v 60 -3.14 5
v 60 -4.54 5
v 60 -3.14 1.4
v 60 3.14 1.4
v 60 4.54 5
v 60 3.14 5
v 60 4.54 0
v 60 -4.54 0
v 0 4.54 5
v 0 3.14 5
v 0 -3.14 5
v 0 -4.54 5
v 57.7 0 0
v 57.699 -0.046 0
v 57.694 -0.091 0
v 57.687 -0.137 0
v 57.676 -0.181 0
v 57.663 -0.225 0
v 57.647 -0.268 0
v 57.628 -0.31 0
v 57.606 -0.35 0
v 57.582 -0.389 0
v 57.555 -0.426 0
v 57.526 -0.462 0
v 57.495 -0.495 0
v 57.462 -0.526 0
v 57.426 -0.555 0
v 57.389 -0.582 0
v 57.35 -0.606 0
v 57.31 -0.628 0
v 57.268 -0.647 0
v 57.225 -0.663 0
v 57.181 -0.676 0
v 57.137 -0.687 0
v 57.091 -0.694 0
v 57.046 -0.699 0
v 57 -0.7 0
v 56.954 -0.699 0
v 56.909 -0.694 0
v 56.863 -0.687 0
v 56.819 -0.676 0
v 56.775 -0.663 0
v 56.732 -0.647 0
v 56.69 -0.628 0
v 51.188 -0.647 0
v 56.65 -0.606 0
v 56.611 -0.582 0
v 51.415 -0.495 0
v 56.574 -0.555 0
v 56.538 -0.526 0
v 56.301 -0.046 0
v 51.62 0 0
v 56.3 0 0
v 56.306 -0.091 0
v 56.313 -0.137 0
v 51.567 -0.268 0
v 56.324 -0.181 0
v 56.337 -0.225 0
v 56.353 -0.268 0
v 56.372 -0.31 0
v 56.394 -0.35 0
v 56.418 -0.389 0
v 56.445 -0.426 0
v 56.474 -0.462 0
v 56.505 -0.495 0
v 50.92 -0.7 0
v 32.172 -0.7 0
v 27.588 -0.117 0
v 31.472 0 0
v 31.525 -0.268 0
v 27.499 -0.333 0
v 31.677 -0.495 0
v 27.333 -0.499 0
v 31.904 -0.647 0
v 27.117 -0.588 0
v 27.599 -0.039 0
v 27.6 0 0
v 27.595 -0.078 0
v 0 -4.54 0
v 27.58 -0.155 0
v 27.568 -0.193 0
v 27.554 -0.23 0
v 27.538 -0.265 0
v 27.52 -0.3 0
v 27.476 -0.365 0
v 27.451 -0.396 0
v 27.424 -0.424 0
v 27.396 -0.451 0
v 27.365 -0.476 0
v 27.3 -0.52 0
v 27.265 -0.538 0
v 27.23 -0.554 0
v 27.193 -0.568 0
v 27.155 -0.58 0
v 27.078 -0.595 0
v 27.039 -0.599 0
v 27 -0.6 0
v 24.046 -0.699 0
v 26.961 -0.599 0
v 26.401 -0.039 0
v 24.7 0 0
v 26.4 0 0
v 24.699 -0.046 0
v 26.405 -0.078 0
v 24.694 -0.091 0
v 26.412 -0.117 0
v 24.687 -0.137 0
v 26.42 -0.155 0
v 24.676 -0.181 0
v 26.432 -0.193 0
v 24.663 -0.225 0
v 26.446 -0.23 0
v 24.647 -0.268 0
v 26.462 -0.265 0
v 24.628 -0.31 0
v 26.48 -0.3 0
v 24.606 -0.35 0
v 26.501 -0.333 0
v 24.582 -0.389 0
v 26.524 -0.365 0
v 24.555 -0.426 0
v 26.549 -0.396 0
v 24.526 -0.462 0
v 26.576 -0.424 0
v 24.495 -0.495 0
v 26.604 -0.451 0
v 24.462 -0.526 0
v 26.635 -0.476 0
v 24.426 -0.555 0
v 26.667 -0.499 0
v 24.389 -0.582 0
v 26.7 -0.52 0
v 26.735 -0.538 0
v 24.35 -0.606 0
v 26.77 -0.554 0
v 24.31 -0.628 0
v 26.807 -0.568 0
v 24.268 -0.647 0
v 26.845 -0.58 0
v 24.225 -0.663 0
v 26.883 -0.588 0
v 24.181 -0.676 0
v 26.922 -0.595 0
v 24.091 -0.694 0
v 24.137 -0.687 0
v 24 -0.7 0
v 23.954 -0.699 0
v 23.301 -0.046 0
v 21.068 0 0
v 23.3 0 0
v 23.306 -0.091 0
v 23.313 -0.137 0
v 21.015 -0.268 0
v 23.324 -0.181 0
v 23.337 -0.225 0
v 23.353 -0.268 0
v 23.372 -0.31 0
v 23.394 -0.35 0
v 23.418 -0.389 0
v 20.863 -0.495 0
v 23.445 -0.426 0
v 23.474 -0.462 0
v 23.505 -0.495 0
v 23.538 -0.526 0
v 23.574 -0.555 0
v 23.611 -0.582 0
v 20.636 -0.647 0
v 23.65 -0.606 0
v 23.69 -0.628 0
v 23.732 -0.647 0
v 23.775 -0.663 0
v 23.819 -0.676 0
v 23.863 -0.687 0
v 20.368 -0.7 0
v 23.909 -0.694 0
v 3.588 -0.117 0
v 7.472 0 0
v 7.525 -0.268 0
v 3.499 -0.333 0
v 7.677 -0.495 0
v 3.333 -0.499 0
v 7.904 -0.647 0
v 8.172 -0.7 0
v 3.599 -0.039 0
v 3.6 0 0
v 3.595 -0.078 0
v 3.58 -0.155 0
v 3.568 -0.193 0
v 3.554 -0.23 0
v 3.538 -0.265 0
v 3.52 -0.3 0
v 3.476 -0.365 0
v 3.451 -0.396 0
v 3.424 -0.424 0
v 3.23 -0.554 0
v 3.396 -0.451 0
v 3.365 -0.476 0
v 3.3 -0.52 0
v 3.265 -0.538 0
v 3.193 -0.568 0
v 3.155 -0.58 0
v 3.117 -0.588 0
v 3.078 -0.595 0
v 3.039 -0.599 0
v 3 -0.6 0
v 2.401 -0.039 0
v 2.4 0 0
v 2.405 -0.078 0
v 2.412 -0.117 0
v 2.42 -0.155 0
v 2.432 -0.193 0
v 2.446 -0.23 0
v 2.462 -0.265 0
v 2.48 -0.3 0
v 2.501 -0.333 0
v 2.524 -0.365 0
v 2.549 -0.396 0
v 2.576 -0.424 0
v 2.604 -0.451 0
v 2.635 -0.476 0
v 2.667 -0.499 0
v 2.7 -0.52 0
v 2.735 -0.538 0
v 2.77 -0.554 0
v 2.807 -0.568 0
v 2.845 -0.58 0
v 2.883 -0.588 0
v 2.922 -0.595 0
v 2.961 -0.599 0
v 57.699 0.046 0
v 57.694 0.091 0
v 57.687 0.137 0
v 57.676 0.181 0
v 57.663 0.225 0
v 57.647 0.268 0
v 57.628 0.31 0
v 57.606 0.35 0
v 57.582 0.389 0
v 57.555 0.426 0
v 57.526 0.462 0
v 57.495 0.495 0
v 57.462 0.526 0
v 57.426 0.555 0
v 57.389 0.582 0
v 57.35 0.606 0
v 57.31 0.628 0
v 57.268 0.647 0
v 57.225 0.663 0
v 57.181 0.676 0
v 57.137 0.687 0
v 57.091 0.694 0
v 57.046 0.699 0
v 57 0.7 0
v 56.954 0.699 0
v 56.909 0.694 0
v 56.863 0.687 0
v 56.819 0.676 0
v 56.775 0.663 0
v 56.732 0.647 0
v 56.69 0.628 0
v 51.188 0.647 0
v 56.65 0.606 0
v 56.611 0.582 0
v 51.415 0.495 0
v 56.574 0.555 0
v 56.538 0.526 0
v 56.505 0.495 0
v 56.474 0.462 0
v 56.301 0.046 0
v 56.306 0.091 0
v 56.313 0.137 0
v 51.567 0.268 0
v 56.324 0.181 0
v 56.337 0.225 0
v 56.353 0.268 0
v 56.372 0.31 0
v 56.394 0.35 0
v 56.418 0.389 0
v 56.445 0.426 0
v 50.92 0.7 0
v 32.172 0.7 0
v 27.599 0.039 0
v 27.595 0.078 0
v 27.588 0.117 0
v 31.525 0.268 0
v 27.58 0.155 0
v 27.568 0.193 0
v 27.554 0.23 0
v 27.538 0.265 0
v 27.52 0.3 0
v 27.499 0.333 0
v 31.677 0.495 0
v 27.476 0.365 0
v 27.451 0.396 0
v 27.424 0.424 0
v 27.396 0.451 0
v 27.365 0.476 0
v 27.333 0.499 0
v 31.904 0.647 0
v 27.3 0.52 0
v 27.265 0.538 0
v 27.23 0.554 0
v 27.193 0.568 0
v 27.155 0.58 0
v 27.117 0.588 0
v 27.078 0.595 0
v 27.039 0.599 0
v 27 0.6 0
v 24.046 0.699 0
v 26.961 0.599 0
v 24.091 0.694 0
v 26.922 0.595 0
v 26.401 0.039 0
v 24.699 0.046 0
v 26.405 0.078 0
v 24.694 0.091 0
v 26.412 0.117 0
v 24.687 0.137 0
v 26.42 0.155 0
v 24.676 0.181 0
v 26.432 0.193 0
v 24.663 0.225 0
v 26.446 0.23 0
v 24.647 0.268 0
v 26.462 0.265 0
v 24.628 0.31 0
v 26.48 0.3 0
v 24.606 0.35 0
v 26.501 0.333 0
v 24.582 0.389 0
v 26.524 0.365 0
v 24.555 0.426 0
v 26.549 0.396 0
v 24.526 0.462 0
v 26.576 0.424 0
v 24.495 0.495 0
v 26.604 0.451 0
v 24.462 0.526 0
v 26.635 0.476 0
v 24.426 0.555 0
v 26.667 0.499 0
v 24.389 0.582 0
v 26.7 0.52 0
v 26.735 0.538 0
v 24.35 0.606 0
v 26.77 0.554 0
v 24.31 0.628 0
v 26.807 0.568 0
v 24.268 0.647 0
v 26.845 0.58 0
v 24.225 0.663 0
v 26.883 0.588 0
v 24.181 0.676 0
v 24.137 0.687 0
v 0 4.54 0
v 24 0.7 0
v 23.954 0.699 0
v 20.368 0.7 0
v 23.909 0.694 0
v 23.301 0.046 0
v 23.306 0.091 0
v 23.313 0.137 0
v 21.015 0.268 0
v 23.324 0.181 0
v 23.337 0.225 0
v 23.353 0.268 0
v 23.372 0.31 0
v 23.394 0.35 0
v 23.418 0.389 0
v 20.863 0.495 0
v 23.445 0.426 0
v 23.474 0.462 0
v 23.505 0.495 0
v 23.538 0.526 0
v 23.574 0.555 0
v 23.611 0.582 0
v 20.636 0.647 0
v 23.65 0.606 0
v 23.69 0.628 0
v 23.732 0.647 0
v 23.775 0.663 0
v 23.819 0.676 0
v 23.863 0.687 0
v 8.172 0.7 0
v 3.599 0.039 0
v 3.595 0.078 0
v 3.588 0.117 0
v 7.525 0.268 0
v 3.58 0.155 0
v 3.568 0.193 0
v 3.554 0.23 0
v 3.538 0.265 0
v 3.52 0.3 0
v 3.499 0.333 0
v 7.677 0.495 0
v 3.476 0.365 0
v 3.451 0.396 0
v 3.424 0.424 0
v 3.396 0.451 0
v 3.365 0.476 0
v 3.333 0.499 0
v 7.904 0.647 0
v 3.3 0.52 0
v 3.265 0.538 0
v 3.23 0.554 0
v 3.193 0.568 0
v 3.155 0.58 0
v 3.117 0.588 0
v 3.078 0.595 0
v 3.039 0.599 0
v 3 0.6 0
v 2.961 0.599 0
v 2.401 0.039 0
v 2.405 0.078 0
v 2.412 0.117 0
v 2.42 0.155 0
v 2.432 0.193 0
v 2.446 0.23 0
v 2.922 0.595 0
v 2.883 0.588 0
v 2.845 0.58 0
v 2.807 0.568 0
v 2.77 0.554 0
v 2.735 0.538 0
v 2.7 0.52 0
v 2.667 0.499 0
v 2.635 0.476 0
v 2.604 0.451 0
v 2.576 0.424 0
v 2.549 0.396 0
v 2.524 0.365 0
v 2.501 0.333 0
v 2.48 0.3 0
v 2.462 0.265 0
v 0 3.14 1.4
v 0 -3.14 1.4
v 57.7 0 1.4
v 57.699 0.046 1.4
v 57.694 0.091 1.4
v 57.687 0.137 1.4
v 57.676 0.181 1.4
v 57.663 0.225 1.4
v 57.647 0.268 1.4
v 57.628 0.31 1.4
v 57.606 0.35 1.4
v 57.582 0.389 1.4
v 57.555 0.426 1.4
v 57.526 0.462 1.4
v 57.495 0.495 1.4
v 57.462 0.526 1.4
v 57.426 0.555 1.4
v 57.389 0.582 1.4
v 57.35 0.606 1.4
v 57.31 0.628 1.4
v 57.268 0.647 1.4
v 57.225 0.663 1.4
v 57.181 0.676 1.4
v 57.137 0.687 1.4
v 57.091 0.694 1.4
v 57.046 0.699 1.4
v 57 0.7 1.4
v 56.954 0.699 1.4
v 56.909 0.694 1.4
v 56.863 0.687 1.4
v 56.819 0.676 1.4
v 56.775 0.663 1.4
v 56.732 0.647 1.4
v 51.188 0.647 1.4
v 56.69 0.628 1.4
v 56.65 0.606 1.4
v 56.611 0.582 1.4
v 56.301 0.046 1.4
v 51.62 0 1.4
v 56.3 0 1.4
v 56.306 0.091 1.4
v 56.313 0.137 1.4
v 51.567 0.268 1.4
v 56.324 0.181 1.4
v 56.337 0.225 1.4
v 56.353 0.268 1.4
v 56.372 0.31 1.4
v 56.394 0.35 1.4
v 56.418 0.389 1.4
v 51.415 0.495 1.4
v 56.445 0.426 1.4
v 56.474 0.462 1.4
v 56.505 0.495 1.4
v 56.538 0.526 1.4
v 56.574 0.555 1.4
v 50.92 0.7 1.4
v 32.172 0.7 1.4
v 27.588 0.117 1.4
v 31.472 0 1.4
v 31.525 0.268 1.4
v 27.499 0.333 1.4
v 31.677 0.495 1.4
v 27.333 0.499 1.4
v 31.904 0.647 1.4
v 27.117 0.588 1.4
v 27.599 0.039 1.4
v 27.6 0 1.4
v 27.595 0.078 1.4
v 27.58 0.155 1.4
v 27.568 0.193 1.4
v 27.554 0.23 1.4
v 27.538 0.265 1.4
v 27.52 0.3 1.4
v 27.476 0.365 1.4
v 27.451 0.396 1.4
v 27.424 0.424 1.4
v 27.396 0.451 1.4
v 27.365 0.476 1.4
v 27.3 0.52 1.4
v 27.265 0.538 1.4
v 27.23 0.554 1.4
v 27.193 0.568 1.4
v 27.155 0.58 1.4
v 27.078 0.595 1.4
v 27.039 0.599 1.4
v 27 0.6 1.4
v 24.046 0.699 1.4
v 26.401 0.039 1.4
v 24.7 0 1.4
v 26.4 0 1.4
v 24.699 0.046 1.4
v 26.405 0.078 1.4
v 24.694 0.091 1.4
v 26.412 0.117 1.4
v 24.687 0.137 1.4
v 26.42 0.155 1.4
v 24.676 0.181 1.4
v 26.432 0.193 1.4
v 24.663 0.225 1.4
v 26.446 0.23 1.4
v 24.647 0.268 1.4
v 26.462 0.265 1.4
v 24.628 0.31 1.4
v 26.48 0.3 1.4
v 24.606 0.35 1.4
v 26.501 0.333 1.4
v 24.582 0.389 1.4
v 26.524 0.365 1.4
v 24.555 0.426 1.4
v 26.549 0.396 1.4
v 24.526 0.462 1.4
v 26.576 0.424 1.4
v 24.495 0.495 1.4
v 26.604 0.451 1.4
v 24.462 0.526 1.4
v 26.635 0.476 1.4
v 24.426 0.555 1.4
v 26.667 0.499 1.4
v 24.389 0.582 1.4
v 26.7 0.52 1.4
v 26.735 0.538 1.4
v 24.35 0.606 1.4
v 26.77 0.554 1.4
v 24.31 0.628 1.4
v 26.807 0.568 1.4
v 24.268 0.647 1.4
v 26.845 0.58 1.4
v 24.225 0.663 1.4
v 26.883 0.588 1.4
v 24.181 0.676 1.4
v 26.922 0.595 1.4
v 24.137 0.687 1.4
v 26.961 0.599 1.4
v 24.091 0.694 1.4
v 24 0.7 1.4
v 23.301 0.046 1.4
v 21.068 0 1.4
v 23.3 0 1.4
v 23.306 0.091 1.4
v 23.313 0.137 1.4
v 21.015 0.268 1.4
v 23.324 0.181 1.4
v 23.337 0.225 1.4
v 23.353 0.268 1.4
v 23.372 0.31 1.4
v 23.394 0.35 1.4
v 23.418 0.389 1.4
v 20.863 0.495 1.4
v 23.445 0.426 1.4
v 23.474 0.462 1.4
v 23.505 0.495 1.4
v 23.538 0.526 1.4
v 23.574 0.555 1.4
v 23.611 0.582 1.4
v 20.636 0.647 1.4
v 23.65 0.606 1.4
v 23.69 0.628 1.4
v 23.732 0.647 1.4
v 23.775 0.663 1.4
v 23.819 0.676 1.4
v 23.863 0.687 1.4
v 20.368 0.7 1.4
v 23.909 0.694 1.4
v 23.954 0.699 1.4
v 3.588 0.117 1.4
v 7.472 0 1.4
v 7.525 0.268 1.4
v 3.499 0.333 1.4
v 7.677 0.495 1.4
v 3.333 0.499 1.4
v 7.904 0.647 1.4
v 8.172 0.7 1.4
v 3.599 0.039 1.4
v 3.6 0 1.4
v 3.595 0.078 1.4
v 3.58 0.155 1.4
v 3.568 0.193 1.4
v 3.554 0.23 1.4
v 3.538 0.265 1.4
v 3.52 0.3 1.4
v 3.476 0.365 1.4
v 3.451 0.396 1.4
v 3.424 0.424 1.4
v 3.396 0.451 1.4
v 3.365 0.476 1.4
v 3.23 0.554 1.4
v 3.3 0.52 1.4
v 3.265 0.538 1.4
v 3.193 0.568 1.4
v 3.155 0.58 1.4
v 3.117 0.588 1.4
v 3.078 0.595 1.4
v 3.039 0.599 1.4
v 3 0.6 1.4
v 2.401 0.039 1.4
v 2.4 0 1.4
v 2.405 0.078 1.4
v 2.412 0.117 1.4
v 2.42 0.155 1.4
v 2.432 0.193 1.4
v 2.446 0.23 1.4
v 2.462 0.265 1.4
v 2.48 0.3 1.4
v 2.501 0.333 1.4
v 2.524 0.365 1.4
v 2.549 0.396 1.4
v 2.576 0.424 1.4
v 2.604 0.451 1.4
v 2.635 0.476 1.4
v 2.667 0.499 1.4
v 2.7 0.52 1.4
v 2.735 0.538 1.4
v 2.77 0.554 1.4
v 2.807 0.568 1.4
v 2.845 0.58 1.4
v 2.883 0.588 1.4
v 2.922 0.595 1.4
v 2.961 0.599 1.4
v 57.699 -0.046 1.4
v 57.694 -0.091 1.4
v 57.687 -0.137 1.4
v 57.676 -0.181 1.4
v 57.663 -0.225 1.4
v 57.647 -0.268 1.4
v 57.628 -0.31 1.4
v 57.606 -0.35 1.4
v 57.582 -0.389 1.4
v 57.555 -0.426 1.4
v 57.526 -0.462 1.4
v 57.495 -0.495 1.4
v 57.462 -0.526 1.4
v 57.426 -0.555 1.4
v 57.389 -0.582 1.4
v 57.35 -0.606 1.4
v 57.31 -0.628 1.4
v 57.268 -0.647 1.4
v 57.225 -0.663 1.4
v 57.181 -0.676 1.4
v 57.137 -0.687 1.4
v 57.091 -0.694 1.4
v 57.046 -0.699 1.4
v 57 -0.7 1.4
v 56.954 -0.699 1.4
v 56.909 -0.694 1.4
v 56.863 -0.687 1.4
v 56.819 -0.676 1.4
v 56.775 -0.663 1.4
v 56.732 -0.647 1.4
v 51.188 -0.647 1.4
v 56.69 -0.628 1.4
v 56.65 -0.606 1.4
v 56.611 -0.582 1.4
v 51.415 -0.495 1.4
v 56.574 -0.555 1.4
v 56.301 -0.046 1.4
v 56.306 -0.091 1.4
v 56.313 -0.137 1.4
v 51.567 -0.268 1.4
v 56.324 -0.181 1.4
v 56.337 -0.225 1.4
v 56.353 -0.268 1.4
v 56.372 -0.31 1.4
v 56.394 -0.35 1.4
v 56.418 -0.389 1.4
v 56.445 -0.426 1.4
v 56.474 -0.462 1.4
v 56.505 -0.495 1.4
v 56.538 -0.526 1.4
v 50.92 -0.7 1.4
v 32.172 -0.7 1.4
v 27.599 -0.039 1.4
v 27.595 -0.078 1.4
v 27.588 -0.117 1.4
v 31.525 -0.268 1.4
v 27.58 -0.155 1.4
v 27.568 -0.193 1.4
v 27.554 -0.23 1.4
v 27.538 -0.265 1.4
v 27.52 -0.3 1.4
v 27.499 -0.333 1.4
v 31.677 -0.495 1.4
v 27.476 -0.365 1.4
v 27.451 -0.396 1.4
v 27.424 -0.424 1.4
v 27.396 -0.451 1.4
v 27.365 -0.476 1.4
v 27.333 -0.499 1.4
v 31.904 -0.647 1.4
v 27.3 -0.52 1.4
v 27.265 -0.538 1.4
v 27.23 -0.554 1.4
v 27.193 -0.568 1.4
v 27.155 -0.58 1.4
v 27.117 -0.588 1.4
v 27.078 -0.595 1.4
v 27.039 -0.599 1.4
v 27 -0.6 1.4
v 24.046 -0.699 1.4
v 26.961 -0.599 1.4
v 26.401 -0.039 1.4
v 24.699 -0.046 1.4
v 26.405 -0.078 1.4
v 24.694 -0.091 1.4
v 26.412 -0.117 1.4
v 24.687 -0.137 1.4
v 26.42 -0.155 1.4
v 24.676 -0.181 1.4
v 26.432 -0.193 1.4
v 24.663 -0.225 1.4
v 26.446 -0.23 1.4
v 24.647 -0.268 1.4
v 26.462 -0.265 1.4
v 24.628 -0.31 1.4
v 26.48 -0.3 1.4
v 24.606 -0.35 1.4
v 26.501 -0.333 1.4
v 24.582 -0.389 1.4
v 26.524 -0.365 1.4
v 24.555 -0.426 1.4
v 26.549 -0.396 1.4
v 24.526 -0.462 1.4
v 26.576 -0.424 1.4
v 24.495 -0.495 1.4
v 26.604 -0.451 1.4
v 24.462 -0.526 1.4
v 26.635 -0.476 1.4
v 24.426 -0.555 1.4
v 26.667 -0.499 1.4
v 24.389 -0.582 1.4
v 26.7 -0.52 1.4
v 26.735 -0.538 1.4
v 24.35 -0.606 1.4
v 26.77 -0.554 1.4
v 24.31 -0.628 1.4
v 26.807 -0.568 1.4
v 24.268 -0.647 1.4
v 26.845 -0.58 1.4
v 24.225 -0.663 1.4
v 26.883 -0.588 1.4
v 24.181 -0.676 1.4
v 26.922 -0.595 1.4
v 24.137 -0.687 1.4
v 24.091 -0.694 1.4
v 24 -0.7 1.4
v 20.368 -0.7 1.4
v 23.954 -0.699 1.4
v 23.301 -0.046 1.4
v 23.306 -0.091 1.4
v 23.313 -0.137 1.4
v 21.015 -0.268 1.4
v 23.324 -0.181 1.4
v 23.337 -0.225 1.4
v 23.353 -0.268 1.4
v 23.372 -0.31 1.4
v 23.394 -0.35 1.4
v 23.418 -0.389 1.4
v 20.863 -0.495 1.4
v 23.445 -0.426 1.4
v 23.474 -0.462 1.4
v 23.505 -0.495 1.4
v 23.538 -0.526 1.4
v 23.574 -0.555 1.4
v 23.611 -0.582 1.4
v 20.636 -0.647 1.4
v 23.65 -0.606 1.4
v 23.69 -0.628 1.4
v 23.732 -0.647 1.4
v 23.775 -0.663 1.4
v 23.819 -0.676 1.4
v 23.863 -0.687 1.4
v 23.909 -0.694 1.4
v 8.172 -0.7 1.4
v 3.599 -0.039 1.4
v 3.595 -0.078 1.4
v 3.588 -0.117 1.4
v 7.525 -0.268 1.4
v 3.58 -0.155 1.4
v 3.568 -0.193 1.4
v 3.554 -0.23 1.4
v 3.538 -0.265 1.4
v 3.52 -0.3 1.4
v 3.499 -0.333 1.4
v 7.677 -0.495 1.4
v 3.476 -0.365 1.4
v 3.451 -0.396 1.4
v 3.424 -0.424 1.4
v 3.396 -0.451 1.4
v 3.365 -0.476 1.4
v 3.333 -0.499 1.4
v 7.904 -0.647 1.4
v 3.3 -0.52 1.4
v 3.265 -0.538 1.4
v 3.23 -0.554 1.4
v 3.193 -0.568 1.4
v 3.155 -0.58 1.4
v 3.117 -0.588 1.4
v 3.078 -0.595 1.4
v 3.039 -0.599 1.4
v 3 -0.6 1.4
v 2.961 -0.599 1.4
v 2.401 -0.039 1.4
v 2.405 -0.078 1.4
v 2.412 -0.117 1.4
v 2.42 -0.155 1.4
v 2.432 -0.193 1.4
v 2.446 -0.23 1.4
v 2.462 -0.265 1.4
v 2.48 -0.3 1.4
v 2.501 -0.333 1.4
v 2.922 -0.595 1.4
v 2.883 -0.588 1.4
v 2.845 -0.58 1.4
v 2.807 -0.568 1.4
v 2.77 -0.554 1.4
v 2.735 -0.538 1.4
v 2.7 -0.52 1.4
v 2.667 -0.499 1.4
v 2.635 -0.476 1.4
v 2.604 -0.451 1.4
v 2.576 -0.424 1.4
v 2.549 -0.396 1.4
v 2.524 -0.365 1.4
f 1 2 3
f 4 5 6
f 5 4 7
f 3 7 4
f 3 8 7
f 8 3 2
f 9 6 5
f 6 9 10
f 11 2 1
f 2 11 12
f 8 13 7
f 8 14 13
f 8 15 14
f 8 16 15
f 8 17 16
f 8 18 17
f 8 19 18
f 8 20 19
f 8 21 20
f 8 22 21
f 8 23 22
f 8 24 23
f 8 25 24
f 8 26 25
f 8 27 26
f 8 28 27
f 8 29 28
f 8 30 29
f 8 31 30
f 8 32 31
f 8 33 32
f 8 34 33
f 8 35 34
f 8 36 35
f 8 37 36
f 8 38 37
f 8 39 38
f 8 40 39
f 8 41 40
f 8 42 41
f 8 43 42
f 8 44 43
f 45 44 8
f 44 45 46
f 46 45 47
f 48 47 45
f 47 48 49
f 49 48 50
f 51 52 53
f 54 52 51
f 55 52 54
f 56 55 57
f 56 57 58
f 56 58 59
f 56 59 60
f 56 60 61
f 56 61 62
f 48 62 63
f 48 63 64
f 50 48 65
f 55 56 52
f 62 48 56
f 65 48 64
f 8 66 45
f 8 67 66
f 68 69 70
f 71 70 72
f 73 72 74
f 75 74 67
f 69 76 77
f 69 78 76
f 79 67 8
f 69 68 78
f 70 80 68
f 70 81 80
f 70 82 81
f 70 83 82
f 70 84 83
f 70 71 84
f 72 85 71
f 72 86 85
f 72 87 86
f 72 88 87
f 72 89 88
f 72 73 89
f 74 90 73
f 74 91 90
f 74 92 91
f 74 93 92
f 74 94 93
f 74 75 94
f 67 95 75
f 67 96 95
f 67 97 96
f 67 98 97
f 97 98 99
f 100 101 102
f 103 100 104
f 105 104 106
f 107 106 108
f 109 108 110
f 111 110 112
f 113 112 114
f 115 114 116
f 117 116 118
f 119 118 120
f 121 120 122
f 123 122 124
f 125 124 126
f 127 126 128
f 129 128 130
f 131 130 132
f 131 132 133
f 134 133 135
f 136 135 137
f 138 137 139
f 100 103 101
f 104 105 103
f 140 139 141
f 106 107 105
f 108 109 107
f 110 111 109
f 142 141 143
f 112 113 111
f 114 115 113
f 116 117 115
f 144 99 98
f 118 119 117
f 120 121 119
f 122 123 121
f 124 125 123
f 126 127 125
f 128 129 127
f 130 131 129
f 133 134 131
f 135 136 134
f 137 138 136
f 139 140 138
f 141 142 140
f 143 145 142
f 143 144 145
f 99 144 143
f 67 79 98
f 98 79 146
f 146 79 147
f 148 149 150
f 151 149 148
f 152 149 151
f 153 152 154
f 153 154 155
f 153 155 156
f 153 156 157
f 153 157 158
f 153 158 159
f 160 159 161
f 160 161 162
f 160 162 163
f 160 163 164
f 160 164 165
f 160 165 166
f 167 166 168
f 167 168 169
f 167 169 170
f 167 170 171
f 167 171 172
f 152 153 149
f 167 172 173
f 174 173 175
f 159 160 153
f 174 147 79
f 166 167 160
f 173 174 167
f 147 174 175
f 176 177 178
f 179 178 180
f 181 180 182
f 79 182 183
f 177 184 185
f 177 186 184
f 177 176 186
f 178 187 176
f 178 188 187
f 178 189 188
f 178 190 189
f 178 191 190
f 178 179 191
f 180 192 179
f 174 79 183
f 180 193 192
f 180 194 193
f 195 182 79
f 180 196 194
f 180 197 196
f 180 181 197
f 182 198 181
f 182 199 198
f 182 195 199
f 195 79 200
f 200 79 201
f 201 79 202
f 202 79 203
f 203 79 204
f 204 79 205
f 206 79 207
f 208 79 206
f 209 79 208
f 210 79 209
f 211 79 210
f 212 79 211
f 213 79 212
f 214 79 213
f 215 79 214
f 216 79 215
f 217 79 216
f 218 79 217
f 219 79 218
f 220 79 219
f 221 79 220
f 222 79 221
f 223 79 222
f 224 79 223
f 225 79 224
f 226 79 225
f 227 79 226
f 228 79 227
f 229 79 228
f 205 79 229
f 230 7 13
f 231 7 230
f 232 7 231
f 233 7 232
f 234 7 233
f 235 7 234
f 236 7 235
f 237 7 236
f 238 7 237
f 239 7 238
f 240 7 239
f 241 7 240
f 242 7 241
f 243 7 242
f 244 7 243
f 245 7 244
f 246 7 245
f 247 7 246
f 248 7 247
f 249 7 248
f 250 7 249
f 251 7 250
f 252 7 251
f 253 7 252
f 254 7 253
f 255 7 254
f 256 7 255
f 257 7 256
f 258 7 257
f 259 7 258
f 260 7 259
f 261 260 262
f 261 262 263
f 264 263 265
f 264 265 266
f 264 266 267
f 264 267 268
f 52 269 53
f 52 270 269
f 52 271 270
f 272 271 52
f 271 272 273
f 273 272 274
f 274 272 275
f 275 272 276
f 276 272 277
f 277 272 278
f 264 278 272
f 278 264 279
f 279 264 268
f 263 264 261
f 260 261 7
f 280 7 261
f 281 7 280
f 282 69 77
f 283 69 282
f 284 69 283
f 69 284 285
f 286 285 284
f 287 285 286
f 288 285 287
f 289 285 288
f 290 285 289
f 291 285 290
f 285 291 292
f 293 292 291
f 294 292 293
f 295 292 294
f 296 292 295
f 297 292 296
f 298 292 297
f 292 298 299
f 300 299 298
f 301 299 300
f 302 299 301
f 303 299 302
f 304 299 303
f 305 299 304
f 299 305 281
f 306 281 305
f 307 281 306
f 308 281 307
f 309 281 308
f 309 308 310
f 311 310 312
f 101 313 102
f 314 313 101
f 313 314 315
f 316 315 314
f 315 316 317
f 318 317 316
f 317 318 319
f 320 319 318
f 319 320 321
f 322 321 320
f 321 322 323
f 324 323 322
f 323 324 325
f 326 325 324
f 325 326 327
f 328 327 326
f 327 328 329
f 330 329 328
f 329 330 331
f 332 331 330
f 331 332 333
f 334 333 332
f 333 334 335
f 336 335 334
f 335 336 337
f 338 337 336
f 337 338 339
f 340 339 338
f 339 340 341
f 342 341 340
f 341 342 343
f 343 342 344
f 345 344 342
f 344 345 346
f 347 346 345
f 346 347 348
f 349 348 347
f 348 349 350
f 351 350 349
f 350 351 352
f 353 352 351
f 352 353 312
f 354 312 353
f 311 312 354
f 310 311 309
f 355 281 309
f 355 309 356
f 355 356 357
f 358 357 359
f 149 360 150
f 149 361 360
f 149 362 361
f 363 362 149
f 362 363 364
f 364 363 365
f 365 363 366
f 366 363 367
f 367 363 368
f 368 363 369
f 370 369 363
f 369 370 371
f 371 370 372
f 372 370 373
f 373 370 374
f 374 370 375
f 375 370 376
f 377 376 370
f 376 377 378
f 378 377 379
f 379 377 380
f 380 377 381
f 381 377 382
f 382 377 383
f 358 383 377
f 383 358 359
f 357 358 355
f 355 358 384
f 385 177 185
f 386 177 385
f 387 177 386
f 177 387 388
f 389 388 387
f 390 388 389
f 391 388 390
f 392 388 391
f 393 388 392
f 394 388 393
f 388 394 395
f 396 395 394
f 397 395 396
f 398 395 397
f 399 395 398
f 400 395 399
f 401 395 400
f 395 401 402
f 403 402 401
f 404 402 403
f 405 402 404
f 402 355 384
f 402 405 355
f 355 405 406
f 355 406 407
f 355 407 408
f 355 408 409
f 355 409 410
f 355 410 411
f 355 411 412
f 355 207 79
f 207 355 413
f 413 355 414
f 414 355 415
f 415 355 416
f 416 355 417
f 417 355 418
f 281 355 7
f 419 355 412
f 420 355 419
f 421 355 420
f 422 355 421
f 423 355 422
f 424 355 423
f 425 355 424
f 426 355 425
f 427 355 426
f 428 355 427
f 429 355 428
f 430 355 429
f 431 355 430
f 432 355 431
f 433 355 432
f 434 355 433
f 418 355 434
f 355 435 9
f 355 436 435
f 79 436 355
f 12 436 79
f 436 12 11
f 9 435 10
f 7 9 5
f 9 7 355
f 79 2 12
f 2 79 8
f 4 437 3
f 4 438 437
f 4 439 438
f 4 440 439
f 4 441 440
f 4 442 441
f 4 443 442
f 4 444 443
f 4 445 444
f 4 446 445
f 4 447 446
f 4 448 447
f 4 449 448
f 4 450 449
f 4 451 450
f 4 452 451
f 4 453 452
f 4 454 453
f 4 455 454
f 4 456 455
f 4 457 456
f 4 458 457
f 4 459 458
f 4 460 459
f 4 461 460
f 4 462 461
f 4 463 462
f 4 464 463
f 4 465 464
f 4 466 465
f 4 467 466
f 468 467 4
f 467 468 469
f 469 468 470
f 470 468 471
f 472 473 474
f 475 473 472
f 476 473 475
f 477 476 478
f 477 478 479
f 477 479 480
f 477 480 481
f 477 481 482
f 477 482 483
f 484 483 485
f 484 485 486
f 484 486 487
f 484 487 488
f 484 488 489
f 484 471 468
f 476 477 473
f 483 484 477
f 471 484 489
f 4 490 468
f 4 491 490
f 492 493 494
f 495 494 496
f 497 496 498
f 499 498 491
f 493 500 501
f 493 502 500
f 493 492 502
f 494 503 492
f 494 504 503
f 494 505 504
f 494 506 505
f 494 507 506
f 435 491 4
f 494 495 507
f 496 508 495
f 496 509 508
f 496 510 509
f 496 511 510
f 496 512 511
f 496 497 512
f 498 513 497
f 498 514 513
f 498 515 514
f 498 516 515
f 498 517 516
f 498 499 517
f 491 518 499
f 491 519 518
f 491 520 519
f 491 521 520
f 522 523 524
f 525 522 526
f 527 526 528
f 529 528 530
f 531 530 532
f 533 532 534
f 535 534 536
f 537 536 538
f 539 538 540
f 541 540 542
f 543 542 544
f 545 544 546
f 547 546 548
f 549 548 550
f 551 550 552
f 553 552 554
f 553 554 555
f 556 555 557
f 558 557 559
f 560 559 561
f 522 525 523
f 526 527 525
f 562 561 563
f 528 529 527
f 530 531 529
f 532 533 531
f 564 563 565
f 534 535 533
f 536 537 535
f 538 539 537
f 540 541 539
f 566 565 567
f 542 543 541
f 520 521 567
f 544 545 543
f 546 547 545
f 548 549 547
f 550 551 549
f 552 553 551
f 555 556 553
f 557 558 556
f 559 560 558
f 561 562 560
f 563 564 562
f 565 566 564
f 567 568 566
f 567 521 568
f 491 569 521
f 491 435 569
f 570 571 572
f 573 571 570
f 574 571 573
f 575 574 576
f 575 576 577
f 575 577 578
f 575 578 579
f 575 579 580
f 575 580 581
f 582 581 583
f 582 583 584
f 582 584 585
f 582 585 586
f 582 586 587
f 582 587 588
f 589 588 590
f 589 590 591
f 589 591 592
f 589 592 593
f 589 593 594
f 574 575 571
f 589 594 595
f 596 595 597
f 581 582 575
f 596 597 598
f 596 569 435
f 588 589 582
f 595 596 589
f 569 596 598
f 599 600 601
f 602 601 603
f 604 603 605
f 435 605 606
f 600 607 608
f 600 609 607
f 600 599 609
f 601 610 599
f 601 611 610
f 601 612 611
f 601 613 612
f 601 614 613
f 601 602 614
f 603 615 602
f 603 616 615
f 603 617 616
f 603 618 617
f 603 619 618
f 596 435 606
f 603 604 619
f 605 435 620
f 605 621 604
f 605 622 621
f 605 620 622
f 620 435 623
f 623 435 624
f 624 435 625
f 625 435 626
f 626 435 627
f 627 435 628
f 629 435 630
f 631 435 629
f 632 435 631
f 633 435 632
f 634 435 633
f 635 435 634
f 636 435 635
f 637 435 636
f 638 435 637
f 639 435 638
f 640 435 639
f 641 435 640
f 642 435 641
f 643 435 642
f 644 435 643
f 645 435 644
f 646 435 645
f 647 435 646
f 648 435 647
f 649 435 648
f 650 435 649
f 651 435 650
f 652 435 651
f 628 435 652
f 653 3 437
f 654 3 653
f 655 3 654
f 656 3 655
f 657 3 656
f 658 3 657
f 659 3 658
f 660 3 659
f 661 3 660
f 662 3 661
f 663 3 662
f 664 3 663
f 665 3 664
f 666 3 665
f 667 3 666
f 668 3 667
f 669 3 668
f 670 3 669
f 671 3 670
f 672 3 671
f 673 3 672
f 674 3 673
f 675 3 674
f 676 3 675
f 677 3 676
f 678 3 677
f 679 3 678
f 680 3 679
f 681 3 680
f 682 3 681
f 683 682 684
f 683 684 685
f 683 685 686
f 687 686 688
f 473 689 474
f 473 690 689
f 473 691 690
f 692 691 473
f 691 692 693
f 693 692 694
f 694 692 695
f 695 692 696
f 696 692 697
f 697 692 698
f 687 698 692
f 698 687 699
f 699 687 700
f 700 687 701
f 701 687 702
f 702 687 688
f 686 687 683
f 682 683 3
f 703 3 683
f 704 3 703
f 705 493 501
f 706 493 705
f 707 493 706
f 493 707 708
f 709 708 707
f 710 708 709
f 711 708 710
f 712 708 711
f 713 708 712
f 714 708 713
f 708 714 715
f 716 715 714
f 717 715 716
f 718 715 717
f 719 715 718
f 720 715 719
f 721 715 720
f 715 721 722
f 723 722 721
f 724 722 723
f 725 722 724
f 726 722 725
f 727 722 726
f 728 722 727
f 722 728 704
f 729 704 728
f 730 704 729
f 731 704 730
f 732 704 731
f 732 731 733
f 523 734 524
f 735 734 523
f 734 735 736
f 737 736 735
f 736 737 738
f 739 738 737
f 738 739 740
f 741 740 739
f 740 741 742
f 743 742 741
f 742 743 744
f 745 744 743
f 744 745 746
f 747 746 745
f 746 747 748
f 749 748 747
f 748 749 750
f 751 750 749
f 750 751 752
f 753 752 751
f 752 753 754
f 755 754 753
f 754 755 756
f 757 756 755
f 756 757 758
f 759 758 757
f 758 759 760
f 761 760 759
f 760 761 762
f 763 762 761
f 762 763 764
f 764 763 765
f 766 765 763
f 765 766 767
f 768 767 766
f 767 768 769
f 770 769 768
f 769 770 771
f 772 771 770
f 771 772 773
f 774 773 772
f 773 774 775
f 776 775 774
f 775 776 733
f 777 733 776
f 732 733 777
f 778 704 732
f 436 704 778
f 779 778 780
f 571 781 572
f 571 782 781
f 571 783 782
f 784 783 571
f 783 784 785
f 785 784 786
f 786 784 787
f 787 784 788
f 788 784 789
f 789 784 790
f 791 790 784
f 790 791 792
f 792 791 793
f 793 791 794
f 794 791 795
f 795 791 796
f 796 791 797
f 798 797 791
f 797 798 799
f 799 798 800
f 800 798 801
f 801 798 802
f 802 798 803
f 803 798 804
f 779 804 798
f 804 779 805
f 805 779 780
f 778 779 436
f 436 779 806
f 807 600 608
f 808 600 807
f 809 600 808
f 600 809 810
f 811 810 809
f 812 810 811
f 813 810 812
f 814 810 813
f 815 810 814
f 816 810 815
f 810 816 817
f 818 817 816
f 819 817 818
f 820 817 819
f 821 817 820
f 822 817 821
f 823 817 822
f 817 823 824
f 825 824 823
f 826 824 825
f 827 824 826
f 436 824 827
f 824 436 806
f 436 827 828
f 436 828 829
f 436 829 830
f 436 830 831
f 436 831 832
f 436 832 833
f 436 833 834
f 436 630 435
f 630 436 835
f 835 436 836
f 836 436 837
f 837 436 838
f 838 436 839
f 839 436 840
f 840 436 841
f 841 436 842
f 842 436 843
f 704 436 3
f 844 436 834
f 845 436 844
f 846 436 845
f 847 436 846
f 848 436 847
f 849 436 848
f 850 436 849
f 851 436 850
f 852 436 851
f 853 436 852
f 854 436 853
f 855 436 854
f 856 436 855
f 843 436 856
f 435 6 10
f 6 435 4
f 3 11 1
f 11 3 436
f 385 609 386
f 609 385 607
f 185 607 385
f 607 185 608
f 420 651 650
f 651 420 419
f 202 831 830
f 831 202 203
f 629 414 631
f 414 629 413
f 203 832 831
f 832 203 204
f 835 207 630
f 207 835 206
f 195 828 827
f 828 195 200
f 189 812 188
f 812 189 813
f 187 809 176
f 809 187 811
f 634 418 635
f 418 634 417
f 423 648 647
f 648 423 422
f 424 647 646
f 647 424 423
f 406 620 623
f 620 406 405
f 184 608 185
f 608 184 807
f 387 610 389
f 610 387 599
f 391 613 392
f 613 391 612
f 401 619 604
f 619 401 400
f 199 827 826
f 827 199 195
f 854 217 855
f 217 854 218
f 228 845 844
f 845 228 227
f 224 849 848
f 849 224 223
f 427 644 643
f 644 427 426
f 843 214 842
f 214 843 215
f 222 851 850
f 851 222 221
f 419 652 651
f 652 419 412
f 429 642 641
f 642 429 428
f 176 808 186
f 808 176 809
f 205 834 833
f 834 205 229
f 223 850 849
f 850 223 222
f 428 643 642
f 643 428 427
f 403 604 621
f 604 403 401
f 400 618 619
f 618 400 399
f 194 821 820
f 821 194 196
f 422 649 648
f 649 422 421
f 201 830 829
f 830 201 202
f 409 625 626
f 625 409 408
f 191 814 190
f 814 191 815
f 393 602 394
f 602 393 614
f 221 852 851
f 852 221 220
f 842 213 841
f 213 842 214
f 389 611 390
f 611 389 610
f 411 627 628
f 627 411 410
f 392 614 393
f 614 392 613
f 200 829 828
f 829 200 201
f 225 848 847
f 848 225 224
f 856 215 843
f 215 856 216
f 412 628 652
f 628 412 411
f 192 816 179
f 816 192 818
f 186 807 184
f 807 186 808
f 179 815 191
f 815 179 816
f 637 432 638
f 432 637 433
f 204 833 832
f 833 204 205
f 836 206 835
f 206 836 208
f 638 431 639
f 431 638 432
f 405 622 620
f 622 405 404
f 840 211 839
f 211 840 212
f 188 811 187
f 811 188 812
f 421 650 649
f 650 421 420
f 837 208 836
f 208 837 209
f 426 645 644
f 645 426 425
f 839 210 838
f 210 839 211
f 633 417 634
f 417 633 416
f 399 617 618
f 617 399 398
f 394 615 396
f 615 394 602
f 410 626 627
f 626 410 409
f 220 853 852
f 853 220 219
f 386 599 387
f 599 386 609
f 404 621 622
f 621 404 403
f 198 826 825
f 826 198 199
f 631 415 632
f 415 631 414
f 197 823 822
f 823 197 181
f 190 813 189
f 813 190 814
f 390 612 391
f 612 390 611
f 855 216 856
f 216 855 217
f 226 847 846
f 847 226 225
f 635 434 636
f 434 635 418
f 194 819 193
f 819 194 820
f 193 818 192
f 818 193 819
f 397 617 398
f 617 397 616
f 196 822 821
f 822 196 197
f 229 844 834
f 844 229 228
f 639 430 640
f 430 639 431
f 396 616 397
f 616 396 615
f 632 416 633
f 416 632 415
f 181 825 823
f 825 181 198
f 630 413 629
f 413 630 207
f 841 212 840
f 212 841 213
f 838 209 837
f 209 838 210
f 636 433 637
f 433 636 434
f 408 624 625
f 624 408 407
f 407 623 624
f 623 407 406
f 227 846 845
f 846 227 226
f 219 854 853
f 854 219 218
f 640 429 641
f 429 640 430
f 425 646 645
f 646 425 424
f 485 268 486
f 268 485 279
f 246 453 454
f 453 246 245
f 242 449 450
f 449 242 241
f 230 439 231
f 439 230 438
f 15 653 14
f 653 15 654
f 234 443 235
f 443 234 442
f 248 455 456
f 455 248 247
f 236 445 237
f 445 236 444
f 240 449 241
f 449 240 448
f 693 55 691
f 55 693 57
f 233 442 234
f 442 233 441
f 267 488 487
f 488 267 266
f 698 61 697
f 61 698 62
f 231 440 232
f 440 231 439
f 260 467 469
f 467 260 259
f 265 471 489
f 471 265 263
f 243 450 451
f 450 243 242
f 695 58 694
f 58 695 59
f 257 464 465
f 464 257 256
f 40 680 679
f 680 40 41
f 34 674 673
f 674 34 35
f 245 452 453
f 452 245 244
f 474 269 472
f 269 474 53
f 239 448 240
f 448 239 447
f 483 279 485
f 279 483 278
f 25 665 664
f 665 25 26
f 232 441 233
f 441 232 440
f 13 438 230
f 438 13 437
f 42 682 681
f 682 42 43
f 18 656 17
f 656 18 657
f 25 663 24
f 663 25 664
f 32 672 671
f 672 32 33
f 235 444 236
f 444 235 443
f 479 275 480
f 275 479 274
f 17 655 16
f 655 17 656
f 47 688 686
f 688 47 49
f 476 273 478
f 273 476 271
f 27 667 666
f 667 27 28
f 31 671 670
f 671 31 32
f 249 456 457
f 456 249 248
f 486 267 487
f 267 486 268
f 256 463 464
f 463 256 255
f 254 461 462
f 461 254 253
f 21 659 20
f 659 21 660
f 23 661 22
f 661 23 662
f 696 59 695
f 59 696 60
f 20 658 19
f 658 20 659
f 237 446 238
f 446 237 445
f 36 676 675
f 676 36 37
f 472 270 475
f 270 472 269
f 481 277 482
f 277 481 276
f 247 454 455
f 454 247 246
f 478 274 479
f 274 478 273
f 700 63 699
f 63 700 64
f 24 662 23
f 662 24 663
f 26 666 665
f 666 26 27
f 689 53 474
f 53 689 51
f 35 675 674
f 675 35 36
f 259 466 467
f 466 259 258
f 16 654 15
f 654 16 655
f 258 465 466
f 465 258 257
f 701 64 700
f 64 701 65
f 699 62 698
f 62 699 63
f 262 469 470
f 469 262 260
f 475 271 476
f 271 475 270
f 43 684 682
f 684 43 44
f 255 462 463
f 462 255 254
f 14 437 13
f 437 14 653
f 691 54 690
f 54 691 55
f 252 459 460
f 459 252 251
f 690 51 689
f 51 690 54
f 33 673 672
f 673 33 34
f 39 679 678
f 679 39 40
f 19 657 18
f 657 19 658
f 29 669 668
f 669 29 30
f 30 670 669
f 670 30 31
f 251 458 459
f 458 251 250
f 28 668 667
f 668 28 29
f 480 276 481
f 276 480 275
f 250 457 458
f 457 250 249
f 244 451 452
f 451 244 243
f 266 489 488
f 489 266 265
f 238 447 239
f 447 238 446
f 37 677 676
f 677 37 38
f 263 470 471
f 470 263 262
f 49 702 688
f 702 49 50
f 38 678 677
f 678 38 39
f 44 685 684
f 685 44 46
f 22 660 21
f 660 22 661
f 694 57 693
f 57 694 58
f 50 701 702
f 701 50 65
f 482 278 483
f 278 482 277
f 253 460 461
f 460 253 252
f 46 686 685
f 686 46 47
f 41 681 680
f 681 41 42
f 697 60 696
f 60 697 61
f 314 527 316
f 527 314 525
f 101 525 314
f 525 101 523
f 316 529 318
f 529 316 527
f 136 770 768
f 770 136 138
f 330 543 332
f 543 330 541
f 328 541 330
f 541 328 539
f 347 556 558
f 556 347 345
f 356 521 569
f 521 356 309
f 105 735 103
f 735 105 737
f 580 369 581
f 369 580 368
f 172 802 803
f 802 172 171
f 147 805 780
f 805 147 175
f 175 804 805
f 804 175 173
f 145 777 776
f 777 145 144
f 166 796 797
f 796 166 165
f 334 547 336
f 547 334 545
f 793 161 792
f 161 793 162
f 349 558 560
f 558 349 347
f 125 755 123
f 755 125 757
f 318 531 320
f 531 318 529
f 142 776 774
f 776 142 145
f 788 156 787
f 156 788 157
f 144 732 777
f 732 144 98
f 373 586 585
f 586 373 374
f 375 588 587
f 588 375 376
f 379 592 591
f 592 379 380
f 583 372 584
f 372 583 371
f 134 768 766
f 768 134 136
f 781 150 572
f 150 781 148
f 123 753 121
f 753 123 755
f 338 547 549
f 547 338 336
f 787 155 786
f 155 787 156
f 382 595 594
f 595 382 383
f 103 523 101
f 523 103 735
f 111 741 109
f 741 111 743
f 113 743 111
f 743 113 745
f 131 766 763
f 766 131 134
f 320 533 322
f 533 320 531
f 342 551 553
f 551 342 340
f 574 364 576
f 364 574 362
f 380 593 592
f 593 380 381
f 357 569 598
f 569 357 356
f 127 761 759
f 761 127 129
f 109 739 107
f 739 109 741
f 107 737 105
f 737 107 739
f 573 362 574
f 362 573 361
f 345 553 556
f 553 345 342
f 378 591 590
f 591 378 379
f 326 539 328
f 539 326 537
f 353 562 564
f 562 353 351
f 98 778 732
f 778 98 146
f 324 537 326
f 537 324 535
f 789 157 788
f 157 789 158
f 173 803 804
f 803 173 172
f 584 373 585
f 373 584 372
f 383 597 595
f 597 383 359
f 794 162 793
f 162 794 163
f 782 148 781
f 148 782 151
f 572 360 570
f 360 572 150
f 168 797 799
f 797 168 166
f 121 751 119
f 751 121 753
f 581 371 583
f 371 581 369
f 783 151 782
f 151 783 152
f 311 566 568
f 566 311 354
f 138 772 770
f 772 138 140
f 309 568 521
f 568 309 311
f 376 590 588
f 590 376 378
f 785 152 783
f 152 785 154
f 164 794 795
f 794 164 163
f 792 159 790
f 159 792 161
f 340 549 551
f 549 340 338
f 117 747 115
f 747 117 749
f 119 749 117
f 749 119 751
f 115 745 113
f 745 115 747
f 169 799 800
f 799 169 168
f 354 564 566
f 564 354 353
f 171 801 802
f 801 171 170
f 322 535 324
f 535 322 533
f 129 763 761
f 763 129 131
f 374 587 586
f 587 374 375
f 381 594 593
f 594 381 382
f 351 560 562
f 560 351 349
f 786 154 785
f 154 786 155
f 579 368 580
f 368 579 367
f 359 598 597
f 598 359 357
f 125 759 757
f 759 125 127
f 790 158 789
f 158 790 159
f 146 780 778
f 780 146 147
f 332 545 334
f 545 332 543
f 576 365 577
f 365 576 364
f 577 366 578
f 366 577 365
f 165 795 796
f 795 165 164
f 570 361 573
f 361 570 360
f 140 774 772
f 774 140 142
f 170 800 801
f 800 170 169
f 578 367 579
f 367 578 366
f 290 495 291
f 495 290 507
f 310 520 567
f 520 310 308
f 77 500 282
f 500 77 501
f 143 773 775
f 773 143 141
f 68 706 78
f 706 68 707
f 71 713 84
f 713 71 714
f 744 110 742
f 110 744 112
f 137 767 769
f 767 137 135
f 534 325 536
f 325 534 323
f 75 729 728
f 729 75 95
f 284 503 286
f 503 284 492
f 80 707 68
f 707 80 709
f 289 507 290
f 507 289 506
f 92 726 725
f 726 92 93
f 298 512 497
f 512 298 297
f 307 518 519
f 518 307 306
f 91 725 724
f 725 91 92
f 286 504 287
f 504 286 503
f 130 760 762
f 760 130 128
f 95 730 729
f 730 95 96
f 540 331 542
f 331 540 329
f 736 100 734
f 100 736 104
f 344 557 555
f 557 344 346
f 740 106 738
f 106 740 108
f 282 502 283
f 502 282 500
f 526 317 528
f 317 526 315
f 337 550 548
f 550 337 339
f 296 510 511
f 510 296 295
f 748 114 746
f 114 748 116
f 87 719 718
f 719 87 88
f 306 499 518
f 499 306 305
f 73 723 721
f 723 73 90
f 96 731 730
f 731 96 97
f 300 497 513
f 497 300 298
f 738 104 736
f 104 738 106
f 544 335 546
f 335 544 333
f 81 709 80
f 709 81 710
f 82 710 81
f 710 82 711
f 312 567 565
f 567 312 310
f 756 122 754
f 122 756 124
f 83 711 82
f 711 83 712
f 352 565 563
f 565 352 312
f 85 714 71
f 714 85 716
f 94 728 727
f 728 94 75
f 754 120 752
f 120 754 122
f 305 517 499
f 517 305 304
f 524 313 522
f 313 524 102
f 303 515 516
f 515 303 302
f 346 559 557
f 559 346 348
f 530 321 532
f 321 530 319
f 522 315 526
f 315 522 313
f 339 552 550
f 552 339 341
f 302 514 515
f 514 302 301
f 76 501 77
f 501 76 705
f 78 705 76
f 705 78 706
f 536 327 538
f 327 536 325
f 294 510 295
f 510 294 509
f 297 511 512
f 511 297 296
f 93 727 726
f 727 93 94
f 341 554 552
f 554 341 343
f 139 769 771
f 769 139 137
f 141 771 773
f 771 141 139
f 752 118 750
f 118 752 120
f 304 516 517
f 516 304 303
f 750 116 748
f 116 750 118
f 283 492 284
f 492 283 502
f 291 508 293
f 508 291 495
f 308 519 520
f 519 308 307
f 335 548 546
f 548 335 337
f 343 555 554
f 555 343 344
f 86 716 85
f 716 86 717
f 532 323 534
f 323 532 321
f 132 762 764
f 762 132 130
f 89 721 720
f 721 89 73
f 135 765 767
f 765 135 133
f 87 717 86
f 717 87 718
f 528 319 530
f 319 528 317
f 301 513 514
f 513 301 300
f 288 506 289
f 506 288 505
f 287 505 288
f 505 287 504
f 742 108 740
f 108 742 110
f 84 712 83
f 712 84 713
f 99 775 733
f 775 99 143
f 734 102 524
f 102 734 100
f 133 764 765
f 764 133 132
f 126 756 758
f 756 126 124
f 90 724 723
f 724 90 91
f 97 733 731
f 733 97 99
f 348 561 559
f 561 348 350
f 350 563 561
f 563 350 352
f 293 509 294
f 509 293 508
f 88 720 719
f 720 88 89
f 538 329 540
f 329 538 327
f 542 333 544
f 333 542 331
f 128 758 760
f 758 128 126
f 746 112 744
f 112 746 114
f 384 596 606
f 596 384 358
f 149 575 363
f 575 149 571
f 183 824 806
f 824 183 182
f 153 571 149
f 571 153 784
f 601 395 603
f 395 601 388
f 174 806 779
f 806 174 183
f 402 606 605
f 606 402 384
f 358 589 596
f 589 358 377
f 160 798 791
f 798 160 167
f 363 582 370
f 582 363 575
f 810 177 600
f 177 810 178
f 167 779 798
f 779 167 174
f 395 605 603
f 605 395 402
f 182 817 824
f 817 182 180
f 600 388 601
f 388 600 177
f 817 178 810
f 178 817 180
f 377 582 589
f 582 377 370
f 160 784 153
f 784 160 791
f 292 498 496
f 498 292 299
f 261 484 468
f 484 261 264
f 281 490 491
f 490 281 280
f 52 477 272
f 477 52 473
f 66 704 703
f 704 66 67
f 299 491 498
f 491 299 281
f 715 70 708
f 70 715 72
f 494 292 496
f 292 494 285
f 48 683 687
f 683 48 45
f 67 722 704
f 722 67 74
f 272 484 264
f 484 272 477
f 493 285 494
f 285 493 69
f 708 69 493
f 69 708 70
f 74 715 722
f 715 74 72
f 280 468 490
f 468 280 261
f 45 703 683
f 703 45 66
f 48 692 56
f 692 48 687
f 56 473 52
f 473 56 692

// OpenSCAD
// $URL: svn+ssh://mrwhat@ssh.boim.com/home/mrwhat/svn/Walker/trunk/linkageJig.scad $
// $Id: linkageJig.scad 96 2013-06-13 13:09:19Z aaron $

// if we are trying to use 1/4" (20 tpi) pegs in the linkage,
// that is around a 6mm hole (tapping will add a bit)

HoleRad=.3;  // for tapping 1/4", 20tpi
BaseWidth = 6;
BaseHeight = 4;
WallThick = .5;
BaseLen = 30;

BarHeight = BaseHeight + 1;
BarLen = 2*BaseLen;

SlotHoleRad = HoleRad + 0.15;

// Define PART to one of the following values to generate model for desired part.
//       Base , Bar    (default is slat to help printing)
PART="Bar";


// Scale some things up for 3D printing.  At 10:1, some things are too small to print
HoleRad = .6;  SlotHoleRad = .7; WallThick = 1.4;

module tapHole () { cylinder(h=BaseHeight*1.2,r=HoleRad,$fn=96); }
module drillHole () { cylinder(h=BaseHeight*1.2,r=SlotHoleRad,$fn=96); }
module slotHole () { cylinder(h=BaseHeight*1.2,r=SlotHoleRad,$fn=16); }

module TriLinkageJigBase()
{ difference() { union() {
   translate([-BaseLen,-BaseWidth/2,0])
      cube([2.2*BaseLen,BaseWidth,BaseHeight]);
   translate([-BaseWidth/2,0,0])
      cube([BaseWidth,BaseLen*0.9,BaseHeight]);
   }
   translate([-1.1*BaseLen,-BaseWidth/2+WallThick,WallThick])
      cube([2.4*BaseLen,BaseWidth-2*WallThick,BaseHeight]);
   translate([-BaseWidth/2+WallThick,0,WallThick])
      cube([BaseWidth-2*WallThick,BaseLen,BaseHeight]);
   translate([-BaseLen+BaseWidth/2,0,-.1]) drillHole();
   translate([-BaseWidth*.9,0,-.1]) drillHole();
   translate([BaseWidth*.9,0,-.1])  drillHole();
   translate([BaseLen*1.2-BaseWidth*.5,0,-.1]) drillHole();
   translate([-BaseLen/2,0,-.1]) drillHole();
   translate([.6*BaseLen,0,-.1]) drillHole();
   translate([0,BaseWidth,-.1]) drillHole();
   translate([0,BaseLen*.9-BaseWidth*.5,-.1]) drillHole();
   translate([0,BaseLen*.4,-.1]) drillHole();
   hull () {
     translate([-BaseLen+BaseWidth,0,-.1]) slotHole();
     translate([-BaseLen/2-0.4*BaseWidth,0,-.1]) slotHole(); }
   hull () {
     translate([BaseLen*1.2-BaseWidth,0,-.1]) slotHole();
     translate([.6*BaseLen+0.4*BaseWidth,0,-.1]) slotHole(); }
   hull () {
     translate([1.4*BaseWidth,0,-.1]) slotHole();
     translate([.6*BaseLen-0.4*BaseWidth,0,-.1]) slotHole(); }
   hull () {
     translate([-1.4*BaseWidth,0,-.1]) slotHole();
     translate([-.5*BaseLen+0.4*BaseWidth,0,-.1]) slotHole(); }
   hull () {
     translate([0,1.4*BaseWidth,-.1]) slotHole();
     translate([0,0.4*BaseLen-0.4*BaseWidth,-.1]) slotHole(); }
   hull () {
     translate([0,0.8*BaseLen-0.4*BaseWidth,-.1]) slotHole();
     translate([0,0.4*BaseLen+0.4*BaseWidth,-.1]) slotHole(); }
   }
}


module LinkageBar() {
BarWidth = BaseWidth+2.2*WallThick;
difference(){
    translate([0,-BarWidth/2,0]) cube([BarLen,BarWidth,BarHeight]);

  translate([-.1,-BaseWidth/2-.1*WallThick,WallThick])
     cube([BarLen*1.1,BaseWidth+.2*WallThick,BarHeight]);
  translate([BaseWidth/2,0,-.1]) tapHole();
  translate([BarLen-BaseWidth/2,0,-.1]) drillHole();
  translate([0.4*BarLen,0,-.1]) drillHole();
  translate([0.4*BarLen+BaseWidth/2,0,-.1]) tapHole();
  hull() {
     translate([BarWidth*.9,0,-.1]) slotHole();
     translate([0.4*BarLen-0.4*BarWidth,0,-.1]) slotHole(); }
  hull() {
     translate([BarLen-BarWidth,0,-.1]) slotHole();
     translate([0.4*BarLen+0.9*BarWidth,0,-.1]) slotHole(); }
  }
}

//=====================================================

if (PART=="Bar" ) { LinkageBar(); }
else {TriLinkageJigBase(); }
